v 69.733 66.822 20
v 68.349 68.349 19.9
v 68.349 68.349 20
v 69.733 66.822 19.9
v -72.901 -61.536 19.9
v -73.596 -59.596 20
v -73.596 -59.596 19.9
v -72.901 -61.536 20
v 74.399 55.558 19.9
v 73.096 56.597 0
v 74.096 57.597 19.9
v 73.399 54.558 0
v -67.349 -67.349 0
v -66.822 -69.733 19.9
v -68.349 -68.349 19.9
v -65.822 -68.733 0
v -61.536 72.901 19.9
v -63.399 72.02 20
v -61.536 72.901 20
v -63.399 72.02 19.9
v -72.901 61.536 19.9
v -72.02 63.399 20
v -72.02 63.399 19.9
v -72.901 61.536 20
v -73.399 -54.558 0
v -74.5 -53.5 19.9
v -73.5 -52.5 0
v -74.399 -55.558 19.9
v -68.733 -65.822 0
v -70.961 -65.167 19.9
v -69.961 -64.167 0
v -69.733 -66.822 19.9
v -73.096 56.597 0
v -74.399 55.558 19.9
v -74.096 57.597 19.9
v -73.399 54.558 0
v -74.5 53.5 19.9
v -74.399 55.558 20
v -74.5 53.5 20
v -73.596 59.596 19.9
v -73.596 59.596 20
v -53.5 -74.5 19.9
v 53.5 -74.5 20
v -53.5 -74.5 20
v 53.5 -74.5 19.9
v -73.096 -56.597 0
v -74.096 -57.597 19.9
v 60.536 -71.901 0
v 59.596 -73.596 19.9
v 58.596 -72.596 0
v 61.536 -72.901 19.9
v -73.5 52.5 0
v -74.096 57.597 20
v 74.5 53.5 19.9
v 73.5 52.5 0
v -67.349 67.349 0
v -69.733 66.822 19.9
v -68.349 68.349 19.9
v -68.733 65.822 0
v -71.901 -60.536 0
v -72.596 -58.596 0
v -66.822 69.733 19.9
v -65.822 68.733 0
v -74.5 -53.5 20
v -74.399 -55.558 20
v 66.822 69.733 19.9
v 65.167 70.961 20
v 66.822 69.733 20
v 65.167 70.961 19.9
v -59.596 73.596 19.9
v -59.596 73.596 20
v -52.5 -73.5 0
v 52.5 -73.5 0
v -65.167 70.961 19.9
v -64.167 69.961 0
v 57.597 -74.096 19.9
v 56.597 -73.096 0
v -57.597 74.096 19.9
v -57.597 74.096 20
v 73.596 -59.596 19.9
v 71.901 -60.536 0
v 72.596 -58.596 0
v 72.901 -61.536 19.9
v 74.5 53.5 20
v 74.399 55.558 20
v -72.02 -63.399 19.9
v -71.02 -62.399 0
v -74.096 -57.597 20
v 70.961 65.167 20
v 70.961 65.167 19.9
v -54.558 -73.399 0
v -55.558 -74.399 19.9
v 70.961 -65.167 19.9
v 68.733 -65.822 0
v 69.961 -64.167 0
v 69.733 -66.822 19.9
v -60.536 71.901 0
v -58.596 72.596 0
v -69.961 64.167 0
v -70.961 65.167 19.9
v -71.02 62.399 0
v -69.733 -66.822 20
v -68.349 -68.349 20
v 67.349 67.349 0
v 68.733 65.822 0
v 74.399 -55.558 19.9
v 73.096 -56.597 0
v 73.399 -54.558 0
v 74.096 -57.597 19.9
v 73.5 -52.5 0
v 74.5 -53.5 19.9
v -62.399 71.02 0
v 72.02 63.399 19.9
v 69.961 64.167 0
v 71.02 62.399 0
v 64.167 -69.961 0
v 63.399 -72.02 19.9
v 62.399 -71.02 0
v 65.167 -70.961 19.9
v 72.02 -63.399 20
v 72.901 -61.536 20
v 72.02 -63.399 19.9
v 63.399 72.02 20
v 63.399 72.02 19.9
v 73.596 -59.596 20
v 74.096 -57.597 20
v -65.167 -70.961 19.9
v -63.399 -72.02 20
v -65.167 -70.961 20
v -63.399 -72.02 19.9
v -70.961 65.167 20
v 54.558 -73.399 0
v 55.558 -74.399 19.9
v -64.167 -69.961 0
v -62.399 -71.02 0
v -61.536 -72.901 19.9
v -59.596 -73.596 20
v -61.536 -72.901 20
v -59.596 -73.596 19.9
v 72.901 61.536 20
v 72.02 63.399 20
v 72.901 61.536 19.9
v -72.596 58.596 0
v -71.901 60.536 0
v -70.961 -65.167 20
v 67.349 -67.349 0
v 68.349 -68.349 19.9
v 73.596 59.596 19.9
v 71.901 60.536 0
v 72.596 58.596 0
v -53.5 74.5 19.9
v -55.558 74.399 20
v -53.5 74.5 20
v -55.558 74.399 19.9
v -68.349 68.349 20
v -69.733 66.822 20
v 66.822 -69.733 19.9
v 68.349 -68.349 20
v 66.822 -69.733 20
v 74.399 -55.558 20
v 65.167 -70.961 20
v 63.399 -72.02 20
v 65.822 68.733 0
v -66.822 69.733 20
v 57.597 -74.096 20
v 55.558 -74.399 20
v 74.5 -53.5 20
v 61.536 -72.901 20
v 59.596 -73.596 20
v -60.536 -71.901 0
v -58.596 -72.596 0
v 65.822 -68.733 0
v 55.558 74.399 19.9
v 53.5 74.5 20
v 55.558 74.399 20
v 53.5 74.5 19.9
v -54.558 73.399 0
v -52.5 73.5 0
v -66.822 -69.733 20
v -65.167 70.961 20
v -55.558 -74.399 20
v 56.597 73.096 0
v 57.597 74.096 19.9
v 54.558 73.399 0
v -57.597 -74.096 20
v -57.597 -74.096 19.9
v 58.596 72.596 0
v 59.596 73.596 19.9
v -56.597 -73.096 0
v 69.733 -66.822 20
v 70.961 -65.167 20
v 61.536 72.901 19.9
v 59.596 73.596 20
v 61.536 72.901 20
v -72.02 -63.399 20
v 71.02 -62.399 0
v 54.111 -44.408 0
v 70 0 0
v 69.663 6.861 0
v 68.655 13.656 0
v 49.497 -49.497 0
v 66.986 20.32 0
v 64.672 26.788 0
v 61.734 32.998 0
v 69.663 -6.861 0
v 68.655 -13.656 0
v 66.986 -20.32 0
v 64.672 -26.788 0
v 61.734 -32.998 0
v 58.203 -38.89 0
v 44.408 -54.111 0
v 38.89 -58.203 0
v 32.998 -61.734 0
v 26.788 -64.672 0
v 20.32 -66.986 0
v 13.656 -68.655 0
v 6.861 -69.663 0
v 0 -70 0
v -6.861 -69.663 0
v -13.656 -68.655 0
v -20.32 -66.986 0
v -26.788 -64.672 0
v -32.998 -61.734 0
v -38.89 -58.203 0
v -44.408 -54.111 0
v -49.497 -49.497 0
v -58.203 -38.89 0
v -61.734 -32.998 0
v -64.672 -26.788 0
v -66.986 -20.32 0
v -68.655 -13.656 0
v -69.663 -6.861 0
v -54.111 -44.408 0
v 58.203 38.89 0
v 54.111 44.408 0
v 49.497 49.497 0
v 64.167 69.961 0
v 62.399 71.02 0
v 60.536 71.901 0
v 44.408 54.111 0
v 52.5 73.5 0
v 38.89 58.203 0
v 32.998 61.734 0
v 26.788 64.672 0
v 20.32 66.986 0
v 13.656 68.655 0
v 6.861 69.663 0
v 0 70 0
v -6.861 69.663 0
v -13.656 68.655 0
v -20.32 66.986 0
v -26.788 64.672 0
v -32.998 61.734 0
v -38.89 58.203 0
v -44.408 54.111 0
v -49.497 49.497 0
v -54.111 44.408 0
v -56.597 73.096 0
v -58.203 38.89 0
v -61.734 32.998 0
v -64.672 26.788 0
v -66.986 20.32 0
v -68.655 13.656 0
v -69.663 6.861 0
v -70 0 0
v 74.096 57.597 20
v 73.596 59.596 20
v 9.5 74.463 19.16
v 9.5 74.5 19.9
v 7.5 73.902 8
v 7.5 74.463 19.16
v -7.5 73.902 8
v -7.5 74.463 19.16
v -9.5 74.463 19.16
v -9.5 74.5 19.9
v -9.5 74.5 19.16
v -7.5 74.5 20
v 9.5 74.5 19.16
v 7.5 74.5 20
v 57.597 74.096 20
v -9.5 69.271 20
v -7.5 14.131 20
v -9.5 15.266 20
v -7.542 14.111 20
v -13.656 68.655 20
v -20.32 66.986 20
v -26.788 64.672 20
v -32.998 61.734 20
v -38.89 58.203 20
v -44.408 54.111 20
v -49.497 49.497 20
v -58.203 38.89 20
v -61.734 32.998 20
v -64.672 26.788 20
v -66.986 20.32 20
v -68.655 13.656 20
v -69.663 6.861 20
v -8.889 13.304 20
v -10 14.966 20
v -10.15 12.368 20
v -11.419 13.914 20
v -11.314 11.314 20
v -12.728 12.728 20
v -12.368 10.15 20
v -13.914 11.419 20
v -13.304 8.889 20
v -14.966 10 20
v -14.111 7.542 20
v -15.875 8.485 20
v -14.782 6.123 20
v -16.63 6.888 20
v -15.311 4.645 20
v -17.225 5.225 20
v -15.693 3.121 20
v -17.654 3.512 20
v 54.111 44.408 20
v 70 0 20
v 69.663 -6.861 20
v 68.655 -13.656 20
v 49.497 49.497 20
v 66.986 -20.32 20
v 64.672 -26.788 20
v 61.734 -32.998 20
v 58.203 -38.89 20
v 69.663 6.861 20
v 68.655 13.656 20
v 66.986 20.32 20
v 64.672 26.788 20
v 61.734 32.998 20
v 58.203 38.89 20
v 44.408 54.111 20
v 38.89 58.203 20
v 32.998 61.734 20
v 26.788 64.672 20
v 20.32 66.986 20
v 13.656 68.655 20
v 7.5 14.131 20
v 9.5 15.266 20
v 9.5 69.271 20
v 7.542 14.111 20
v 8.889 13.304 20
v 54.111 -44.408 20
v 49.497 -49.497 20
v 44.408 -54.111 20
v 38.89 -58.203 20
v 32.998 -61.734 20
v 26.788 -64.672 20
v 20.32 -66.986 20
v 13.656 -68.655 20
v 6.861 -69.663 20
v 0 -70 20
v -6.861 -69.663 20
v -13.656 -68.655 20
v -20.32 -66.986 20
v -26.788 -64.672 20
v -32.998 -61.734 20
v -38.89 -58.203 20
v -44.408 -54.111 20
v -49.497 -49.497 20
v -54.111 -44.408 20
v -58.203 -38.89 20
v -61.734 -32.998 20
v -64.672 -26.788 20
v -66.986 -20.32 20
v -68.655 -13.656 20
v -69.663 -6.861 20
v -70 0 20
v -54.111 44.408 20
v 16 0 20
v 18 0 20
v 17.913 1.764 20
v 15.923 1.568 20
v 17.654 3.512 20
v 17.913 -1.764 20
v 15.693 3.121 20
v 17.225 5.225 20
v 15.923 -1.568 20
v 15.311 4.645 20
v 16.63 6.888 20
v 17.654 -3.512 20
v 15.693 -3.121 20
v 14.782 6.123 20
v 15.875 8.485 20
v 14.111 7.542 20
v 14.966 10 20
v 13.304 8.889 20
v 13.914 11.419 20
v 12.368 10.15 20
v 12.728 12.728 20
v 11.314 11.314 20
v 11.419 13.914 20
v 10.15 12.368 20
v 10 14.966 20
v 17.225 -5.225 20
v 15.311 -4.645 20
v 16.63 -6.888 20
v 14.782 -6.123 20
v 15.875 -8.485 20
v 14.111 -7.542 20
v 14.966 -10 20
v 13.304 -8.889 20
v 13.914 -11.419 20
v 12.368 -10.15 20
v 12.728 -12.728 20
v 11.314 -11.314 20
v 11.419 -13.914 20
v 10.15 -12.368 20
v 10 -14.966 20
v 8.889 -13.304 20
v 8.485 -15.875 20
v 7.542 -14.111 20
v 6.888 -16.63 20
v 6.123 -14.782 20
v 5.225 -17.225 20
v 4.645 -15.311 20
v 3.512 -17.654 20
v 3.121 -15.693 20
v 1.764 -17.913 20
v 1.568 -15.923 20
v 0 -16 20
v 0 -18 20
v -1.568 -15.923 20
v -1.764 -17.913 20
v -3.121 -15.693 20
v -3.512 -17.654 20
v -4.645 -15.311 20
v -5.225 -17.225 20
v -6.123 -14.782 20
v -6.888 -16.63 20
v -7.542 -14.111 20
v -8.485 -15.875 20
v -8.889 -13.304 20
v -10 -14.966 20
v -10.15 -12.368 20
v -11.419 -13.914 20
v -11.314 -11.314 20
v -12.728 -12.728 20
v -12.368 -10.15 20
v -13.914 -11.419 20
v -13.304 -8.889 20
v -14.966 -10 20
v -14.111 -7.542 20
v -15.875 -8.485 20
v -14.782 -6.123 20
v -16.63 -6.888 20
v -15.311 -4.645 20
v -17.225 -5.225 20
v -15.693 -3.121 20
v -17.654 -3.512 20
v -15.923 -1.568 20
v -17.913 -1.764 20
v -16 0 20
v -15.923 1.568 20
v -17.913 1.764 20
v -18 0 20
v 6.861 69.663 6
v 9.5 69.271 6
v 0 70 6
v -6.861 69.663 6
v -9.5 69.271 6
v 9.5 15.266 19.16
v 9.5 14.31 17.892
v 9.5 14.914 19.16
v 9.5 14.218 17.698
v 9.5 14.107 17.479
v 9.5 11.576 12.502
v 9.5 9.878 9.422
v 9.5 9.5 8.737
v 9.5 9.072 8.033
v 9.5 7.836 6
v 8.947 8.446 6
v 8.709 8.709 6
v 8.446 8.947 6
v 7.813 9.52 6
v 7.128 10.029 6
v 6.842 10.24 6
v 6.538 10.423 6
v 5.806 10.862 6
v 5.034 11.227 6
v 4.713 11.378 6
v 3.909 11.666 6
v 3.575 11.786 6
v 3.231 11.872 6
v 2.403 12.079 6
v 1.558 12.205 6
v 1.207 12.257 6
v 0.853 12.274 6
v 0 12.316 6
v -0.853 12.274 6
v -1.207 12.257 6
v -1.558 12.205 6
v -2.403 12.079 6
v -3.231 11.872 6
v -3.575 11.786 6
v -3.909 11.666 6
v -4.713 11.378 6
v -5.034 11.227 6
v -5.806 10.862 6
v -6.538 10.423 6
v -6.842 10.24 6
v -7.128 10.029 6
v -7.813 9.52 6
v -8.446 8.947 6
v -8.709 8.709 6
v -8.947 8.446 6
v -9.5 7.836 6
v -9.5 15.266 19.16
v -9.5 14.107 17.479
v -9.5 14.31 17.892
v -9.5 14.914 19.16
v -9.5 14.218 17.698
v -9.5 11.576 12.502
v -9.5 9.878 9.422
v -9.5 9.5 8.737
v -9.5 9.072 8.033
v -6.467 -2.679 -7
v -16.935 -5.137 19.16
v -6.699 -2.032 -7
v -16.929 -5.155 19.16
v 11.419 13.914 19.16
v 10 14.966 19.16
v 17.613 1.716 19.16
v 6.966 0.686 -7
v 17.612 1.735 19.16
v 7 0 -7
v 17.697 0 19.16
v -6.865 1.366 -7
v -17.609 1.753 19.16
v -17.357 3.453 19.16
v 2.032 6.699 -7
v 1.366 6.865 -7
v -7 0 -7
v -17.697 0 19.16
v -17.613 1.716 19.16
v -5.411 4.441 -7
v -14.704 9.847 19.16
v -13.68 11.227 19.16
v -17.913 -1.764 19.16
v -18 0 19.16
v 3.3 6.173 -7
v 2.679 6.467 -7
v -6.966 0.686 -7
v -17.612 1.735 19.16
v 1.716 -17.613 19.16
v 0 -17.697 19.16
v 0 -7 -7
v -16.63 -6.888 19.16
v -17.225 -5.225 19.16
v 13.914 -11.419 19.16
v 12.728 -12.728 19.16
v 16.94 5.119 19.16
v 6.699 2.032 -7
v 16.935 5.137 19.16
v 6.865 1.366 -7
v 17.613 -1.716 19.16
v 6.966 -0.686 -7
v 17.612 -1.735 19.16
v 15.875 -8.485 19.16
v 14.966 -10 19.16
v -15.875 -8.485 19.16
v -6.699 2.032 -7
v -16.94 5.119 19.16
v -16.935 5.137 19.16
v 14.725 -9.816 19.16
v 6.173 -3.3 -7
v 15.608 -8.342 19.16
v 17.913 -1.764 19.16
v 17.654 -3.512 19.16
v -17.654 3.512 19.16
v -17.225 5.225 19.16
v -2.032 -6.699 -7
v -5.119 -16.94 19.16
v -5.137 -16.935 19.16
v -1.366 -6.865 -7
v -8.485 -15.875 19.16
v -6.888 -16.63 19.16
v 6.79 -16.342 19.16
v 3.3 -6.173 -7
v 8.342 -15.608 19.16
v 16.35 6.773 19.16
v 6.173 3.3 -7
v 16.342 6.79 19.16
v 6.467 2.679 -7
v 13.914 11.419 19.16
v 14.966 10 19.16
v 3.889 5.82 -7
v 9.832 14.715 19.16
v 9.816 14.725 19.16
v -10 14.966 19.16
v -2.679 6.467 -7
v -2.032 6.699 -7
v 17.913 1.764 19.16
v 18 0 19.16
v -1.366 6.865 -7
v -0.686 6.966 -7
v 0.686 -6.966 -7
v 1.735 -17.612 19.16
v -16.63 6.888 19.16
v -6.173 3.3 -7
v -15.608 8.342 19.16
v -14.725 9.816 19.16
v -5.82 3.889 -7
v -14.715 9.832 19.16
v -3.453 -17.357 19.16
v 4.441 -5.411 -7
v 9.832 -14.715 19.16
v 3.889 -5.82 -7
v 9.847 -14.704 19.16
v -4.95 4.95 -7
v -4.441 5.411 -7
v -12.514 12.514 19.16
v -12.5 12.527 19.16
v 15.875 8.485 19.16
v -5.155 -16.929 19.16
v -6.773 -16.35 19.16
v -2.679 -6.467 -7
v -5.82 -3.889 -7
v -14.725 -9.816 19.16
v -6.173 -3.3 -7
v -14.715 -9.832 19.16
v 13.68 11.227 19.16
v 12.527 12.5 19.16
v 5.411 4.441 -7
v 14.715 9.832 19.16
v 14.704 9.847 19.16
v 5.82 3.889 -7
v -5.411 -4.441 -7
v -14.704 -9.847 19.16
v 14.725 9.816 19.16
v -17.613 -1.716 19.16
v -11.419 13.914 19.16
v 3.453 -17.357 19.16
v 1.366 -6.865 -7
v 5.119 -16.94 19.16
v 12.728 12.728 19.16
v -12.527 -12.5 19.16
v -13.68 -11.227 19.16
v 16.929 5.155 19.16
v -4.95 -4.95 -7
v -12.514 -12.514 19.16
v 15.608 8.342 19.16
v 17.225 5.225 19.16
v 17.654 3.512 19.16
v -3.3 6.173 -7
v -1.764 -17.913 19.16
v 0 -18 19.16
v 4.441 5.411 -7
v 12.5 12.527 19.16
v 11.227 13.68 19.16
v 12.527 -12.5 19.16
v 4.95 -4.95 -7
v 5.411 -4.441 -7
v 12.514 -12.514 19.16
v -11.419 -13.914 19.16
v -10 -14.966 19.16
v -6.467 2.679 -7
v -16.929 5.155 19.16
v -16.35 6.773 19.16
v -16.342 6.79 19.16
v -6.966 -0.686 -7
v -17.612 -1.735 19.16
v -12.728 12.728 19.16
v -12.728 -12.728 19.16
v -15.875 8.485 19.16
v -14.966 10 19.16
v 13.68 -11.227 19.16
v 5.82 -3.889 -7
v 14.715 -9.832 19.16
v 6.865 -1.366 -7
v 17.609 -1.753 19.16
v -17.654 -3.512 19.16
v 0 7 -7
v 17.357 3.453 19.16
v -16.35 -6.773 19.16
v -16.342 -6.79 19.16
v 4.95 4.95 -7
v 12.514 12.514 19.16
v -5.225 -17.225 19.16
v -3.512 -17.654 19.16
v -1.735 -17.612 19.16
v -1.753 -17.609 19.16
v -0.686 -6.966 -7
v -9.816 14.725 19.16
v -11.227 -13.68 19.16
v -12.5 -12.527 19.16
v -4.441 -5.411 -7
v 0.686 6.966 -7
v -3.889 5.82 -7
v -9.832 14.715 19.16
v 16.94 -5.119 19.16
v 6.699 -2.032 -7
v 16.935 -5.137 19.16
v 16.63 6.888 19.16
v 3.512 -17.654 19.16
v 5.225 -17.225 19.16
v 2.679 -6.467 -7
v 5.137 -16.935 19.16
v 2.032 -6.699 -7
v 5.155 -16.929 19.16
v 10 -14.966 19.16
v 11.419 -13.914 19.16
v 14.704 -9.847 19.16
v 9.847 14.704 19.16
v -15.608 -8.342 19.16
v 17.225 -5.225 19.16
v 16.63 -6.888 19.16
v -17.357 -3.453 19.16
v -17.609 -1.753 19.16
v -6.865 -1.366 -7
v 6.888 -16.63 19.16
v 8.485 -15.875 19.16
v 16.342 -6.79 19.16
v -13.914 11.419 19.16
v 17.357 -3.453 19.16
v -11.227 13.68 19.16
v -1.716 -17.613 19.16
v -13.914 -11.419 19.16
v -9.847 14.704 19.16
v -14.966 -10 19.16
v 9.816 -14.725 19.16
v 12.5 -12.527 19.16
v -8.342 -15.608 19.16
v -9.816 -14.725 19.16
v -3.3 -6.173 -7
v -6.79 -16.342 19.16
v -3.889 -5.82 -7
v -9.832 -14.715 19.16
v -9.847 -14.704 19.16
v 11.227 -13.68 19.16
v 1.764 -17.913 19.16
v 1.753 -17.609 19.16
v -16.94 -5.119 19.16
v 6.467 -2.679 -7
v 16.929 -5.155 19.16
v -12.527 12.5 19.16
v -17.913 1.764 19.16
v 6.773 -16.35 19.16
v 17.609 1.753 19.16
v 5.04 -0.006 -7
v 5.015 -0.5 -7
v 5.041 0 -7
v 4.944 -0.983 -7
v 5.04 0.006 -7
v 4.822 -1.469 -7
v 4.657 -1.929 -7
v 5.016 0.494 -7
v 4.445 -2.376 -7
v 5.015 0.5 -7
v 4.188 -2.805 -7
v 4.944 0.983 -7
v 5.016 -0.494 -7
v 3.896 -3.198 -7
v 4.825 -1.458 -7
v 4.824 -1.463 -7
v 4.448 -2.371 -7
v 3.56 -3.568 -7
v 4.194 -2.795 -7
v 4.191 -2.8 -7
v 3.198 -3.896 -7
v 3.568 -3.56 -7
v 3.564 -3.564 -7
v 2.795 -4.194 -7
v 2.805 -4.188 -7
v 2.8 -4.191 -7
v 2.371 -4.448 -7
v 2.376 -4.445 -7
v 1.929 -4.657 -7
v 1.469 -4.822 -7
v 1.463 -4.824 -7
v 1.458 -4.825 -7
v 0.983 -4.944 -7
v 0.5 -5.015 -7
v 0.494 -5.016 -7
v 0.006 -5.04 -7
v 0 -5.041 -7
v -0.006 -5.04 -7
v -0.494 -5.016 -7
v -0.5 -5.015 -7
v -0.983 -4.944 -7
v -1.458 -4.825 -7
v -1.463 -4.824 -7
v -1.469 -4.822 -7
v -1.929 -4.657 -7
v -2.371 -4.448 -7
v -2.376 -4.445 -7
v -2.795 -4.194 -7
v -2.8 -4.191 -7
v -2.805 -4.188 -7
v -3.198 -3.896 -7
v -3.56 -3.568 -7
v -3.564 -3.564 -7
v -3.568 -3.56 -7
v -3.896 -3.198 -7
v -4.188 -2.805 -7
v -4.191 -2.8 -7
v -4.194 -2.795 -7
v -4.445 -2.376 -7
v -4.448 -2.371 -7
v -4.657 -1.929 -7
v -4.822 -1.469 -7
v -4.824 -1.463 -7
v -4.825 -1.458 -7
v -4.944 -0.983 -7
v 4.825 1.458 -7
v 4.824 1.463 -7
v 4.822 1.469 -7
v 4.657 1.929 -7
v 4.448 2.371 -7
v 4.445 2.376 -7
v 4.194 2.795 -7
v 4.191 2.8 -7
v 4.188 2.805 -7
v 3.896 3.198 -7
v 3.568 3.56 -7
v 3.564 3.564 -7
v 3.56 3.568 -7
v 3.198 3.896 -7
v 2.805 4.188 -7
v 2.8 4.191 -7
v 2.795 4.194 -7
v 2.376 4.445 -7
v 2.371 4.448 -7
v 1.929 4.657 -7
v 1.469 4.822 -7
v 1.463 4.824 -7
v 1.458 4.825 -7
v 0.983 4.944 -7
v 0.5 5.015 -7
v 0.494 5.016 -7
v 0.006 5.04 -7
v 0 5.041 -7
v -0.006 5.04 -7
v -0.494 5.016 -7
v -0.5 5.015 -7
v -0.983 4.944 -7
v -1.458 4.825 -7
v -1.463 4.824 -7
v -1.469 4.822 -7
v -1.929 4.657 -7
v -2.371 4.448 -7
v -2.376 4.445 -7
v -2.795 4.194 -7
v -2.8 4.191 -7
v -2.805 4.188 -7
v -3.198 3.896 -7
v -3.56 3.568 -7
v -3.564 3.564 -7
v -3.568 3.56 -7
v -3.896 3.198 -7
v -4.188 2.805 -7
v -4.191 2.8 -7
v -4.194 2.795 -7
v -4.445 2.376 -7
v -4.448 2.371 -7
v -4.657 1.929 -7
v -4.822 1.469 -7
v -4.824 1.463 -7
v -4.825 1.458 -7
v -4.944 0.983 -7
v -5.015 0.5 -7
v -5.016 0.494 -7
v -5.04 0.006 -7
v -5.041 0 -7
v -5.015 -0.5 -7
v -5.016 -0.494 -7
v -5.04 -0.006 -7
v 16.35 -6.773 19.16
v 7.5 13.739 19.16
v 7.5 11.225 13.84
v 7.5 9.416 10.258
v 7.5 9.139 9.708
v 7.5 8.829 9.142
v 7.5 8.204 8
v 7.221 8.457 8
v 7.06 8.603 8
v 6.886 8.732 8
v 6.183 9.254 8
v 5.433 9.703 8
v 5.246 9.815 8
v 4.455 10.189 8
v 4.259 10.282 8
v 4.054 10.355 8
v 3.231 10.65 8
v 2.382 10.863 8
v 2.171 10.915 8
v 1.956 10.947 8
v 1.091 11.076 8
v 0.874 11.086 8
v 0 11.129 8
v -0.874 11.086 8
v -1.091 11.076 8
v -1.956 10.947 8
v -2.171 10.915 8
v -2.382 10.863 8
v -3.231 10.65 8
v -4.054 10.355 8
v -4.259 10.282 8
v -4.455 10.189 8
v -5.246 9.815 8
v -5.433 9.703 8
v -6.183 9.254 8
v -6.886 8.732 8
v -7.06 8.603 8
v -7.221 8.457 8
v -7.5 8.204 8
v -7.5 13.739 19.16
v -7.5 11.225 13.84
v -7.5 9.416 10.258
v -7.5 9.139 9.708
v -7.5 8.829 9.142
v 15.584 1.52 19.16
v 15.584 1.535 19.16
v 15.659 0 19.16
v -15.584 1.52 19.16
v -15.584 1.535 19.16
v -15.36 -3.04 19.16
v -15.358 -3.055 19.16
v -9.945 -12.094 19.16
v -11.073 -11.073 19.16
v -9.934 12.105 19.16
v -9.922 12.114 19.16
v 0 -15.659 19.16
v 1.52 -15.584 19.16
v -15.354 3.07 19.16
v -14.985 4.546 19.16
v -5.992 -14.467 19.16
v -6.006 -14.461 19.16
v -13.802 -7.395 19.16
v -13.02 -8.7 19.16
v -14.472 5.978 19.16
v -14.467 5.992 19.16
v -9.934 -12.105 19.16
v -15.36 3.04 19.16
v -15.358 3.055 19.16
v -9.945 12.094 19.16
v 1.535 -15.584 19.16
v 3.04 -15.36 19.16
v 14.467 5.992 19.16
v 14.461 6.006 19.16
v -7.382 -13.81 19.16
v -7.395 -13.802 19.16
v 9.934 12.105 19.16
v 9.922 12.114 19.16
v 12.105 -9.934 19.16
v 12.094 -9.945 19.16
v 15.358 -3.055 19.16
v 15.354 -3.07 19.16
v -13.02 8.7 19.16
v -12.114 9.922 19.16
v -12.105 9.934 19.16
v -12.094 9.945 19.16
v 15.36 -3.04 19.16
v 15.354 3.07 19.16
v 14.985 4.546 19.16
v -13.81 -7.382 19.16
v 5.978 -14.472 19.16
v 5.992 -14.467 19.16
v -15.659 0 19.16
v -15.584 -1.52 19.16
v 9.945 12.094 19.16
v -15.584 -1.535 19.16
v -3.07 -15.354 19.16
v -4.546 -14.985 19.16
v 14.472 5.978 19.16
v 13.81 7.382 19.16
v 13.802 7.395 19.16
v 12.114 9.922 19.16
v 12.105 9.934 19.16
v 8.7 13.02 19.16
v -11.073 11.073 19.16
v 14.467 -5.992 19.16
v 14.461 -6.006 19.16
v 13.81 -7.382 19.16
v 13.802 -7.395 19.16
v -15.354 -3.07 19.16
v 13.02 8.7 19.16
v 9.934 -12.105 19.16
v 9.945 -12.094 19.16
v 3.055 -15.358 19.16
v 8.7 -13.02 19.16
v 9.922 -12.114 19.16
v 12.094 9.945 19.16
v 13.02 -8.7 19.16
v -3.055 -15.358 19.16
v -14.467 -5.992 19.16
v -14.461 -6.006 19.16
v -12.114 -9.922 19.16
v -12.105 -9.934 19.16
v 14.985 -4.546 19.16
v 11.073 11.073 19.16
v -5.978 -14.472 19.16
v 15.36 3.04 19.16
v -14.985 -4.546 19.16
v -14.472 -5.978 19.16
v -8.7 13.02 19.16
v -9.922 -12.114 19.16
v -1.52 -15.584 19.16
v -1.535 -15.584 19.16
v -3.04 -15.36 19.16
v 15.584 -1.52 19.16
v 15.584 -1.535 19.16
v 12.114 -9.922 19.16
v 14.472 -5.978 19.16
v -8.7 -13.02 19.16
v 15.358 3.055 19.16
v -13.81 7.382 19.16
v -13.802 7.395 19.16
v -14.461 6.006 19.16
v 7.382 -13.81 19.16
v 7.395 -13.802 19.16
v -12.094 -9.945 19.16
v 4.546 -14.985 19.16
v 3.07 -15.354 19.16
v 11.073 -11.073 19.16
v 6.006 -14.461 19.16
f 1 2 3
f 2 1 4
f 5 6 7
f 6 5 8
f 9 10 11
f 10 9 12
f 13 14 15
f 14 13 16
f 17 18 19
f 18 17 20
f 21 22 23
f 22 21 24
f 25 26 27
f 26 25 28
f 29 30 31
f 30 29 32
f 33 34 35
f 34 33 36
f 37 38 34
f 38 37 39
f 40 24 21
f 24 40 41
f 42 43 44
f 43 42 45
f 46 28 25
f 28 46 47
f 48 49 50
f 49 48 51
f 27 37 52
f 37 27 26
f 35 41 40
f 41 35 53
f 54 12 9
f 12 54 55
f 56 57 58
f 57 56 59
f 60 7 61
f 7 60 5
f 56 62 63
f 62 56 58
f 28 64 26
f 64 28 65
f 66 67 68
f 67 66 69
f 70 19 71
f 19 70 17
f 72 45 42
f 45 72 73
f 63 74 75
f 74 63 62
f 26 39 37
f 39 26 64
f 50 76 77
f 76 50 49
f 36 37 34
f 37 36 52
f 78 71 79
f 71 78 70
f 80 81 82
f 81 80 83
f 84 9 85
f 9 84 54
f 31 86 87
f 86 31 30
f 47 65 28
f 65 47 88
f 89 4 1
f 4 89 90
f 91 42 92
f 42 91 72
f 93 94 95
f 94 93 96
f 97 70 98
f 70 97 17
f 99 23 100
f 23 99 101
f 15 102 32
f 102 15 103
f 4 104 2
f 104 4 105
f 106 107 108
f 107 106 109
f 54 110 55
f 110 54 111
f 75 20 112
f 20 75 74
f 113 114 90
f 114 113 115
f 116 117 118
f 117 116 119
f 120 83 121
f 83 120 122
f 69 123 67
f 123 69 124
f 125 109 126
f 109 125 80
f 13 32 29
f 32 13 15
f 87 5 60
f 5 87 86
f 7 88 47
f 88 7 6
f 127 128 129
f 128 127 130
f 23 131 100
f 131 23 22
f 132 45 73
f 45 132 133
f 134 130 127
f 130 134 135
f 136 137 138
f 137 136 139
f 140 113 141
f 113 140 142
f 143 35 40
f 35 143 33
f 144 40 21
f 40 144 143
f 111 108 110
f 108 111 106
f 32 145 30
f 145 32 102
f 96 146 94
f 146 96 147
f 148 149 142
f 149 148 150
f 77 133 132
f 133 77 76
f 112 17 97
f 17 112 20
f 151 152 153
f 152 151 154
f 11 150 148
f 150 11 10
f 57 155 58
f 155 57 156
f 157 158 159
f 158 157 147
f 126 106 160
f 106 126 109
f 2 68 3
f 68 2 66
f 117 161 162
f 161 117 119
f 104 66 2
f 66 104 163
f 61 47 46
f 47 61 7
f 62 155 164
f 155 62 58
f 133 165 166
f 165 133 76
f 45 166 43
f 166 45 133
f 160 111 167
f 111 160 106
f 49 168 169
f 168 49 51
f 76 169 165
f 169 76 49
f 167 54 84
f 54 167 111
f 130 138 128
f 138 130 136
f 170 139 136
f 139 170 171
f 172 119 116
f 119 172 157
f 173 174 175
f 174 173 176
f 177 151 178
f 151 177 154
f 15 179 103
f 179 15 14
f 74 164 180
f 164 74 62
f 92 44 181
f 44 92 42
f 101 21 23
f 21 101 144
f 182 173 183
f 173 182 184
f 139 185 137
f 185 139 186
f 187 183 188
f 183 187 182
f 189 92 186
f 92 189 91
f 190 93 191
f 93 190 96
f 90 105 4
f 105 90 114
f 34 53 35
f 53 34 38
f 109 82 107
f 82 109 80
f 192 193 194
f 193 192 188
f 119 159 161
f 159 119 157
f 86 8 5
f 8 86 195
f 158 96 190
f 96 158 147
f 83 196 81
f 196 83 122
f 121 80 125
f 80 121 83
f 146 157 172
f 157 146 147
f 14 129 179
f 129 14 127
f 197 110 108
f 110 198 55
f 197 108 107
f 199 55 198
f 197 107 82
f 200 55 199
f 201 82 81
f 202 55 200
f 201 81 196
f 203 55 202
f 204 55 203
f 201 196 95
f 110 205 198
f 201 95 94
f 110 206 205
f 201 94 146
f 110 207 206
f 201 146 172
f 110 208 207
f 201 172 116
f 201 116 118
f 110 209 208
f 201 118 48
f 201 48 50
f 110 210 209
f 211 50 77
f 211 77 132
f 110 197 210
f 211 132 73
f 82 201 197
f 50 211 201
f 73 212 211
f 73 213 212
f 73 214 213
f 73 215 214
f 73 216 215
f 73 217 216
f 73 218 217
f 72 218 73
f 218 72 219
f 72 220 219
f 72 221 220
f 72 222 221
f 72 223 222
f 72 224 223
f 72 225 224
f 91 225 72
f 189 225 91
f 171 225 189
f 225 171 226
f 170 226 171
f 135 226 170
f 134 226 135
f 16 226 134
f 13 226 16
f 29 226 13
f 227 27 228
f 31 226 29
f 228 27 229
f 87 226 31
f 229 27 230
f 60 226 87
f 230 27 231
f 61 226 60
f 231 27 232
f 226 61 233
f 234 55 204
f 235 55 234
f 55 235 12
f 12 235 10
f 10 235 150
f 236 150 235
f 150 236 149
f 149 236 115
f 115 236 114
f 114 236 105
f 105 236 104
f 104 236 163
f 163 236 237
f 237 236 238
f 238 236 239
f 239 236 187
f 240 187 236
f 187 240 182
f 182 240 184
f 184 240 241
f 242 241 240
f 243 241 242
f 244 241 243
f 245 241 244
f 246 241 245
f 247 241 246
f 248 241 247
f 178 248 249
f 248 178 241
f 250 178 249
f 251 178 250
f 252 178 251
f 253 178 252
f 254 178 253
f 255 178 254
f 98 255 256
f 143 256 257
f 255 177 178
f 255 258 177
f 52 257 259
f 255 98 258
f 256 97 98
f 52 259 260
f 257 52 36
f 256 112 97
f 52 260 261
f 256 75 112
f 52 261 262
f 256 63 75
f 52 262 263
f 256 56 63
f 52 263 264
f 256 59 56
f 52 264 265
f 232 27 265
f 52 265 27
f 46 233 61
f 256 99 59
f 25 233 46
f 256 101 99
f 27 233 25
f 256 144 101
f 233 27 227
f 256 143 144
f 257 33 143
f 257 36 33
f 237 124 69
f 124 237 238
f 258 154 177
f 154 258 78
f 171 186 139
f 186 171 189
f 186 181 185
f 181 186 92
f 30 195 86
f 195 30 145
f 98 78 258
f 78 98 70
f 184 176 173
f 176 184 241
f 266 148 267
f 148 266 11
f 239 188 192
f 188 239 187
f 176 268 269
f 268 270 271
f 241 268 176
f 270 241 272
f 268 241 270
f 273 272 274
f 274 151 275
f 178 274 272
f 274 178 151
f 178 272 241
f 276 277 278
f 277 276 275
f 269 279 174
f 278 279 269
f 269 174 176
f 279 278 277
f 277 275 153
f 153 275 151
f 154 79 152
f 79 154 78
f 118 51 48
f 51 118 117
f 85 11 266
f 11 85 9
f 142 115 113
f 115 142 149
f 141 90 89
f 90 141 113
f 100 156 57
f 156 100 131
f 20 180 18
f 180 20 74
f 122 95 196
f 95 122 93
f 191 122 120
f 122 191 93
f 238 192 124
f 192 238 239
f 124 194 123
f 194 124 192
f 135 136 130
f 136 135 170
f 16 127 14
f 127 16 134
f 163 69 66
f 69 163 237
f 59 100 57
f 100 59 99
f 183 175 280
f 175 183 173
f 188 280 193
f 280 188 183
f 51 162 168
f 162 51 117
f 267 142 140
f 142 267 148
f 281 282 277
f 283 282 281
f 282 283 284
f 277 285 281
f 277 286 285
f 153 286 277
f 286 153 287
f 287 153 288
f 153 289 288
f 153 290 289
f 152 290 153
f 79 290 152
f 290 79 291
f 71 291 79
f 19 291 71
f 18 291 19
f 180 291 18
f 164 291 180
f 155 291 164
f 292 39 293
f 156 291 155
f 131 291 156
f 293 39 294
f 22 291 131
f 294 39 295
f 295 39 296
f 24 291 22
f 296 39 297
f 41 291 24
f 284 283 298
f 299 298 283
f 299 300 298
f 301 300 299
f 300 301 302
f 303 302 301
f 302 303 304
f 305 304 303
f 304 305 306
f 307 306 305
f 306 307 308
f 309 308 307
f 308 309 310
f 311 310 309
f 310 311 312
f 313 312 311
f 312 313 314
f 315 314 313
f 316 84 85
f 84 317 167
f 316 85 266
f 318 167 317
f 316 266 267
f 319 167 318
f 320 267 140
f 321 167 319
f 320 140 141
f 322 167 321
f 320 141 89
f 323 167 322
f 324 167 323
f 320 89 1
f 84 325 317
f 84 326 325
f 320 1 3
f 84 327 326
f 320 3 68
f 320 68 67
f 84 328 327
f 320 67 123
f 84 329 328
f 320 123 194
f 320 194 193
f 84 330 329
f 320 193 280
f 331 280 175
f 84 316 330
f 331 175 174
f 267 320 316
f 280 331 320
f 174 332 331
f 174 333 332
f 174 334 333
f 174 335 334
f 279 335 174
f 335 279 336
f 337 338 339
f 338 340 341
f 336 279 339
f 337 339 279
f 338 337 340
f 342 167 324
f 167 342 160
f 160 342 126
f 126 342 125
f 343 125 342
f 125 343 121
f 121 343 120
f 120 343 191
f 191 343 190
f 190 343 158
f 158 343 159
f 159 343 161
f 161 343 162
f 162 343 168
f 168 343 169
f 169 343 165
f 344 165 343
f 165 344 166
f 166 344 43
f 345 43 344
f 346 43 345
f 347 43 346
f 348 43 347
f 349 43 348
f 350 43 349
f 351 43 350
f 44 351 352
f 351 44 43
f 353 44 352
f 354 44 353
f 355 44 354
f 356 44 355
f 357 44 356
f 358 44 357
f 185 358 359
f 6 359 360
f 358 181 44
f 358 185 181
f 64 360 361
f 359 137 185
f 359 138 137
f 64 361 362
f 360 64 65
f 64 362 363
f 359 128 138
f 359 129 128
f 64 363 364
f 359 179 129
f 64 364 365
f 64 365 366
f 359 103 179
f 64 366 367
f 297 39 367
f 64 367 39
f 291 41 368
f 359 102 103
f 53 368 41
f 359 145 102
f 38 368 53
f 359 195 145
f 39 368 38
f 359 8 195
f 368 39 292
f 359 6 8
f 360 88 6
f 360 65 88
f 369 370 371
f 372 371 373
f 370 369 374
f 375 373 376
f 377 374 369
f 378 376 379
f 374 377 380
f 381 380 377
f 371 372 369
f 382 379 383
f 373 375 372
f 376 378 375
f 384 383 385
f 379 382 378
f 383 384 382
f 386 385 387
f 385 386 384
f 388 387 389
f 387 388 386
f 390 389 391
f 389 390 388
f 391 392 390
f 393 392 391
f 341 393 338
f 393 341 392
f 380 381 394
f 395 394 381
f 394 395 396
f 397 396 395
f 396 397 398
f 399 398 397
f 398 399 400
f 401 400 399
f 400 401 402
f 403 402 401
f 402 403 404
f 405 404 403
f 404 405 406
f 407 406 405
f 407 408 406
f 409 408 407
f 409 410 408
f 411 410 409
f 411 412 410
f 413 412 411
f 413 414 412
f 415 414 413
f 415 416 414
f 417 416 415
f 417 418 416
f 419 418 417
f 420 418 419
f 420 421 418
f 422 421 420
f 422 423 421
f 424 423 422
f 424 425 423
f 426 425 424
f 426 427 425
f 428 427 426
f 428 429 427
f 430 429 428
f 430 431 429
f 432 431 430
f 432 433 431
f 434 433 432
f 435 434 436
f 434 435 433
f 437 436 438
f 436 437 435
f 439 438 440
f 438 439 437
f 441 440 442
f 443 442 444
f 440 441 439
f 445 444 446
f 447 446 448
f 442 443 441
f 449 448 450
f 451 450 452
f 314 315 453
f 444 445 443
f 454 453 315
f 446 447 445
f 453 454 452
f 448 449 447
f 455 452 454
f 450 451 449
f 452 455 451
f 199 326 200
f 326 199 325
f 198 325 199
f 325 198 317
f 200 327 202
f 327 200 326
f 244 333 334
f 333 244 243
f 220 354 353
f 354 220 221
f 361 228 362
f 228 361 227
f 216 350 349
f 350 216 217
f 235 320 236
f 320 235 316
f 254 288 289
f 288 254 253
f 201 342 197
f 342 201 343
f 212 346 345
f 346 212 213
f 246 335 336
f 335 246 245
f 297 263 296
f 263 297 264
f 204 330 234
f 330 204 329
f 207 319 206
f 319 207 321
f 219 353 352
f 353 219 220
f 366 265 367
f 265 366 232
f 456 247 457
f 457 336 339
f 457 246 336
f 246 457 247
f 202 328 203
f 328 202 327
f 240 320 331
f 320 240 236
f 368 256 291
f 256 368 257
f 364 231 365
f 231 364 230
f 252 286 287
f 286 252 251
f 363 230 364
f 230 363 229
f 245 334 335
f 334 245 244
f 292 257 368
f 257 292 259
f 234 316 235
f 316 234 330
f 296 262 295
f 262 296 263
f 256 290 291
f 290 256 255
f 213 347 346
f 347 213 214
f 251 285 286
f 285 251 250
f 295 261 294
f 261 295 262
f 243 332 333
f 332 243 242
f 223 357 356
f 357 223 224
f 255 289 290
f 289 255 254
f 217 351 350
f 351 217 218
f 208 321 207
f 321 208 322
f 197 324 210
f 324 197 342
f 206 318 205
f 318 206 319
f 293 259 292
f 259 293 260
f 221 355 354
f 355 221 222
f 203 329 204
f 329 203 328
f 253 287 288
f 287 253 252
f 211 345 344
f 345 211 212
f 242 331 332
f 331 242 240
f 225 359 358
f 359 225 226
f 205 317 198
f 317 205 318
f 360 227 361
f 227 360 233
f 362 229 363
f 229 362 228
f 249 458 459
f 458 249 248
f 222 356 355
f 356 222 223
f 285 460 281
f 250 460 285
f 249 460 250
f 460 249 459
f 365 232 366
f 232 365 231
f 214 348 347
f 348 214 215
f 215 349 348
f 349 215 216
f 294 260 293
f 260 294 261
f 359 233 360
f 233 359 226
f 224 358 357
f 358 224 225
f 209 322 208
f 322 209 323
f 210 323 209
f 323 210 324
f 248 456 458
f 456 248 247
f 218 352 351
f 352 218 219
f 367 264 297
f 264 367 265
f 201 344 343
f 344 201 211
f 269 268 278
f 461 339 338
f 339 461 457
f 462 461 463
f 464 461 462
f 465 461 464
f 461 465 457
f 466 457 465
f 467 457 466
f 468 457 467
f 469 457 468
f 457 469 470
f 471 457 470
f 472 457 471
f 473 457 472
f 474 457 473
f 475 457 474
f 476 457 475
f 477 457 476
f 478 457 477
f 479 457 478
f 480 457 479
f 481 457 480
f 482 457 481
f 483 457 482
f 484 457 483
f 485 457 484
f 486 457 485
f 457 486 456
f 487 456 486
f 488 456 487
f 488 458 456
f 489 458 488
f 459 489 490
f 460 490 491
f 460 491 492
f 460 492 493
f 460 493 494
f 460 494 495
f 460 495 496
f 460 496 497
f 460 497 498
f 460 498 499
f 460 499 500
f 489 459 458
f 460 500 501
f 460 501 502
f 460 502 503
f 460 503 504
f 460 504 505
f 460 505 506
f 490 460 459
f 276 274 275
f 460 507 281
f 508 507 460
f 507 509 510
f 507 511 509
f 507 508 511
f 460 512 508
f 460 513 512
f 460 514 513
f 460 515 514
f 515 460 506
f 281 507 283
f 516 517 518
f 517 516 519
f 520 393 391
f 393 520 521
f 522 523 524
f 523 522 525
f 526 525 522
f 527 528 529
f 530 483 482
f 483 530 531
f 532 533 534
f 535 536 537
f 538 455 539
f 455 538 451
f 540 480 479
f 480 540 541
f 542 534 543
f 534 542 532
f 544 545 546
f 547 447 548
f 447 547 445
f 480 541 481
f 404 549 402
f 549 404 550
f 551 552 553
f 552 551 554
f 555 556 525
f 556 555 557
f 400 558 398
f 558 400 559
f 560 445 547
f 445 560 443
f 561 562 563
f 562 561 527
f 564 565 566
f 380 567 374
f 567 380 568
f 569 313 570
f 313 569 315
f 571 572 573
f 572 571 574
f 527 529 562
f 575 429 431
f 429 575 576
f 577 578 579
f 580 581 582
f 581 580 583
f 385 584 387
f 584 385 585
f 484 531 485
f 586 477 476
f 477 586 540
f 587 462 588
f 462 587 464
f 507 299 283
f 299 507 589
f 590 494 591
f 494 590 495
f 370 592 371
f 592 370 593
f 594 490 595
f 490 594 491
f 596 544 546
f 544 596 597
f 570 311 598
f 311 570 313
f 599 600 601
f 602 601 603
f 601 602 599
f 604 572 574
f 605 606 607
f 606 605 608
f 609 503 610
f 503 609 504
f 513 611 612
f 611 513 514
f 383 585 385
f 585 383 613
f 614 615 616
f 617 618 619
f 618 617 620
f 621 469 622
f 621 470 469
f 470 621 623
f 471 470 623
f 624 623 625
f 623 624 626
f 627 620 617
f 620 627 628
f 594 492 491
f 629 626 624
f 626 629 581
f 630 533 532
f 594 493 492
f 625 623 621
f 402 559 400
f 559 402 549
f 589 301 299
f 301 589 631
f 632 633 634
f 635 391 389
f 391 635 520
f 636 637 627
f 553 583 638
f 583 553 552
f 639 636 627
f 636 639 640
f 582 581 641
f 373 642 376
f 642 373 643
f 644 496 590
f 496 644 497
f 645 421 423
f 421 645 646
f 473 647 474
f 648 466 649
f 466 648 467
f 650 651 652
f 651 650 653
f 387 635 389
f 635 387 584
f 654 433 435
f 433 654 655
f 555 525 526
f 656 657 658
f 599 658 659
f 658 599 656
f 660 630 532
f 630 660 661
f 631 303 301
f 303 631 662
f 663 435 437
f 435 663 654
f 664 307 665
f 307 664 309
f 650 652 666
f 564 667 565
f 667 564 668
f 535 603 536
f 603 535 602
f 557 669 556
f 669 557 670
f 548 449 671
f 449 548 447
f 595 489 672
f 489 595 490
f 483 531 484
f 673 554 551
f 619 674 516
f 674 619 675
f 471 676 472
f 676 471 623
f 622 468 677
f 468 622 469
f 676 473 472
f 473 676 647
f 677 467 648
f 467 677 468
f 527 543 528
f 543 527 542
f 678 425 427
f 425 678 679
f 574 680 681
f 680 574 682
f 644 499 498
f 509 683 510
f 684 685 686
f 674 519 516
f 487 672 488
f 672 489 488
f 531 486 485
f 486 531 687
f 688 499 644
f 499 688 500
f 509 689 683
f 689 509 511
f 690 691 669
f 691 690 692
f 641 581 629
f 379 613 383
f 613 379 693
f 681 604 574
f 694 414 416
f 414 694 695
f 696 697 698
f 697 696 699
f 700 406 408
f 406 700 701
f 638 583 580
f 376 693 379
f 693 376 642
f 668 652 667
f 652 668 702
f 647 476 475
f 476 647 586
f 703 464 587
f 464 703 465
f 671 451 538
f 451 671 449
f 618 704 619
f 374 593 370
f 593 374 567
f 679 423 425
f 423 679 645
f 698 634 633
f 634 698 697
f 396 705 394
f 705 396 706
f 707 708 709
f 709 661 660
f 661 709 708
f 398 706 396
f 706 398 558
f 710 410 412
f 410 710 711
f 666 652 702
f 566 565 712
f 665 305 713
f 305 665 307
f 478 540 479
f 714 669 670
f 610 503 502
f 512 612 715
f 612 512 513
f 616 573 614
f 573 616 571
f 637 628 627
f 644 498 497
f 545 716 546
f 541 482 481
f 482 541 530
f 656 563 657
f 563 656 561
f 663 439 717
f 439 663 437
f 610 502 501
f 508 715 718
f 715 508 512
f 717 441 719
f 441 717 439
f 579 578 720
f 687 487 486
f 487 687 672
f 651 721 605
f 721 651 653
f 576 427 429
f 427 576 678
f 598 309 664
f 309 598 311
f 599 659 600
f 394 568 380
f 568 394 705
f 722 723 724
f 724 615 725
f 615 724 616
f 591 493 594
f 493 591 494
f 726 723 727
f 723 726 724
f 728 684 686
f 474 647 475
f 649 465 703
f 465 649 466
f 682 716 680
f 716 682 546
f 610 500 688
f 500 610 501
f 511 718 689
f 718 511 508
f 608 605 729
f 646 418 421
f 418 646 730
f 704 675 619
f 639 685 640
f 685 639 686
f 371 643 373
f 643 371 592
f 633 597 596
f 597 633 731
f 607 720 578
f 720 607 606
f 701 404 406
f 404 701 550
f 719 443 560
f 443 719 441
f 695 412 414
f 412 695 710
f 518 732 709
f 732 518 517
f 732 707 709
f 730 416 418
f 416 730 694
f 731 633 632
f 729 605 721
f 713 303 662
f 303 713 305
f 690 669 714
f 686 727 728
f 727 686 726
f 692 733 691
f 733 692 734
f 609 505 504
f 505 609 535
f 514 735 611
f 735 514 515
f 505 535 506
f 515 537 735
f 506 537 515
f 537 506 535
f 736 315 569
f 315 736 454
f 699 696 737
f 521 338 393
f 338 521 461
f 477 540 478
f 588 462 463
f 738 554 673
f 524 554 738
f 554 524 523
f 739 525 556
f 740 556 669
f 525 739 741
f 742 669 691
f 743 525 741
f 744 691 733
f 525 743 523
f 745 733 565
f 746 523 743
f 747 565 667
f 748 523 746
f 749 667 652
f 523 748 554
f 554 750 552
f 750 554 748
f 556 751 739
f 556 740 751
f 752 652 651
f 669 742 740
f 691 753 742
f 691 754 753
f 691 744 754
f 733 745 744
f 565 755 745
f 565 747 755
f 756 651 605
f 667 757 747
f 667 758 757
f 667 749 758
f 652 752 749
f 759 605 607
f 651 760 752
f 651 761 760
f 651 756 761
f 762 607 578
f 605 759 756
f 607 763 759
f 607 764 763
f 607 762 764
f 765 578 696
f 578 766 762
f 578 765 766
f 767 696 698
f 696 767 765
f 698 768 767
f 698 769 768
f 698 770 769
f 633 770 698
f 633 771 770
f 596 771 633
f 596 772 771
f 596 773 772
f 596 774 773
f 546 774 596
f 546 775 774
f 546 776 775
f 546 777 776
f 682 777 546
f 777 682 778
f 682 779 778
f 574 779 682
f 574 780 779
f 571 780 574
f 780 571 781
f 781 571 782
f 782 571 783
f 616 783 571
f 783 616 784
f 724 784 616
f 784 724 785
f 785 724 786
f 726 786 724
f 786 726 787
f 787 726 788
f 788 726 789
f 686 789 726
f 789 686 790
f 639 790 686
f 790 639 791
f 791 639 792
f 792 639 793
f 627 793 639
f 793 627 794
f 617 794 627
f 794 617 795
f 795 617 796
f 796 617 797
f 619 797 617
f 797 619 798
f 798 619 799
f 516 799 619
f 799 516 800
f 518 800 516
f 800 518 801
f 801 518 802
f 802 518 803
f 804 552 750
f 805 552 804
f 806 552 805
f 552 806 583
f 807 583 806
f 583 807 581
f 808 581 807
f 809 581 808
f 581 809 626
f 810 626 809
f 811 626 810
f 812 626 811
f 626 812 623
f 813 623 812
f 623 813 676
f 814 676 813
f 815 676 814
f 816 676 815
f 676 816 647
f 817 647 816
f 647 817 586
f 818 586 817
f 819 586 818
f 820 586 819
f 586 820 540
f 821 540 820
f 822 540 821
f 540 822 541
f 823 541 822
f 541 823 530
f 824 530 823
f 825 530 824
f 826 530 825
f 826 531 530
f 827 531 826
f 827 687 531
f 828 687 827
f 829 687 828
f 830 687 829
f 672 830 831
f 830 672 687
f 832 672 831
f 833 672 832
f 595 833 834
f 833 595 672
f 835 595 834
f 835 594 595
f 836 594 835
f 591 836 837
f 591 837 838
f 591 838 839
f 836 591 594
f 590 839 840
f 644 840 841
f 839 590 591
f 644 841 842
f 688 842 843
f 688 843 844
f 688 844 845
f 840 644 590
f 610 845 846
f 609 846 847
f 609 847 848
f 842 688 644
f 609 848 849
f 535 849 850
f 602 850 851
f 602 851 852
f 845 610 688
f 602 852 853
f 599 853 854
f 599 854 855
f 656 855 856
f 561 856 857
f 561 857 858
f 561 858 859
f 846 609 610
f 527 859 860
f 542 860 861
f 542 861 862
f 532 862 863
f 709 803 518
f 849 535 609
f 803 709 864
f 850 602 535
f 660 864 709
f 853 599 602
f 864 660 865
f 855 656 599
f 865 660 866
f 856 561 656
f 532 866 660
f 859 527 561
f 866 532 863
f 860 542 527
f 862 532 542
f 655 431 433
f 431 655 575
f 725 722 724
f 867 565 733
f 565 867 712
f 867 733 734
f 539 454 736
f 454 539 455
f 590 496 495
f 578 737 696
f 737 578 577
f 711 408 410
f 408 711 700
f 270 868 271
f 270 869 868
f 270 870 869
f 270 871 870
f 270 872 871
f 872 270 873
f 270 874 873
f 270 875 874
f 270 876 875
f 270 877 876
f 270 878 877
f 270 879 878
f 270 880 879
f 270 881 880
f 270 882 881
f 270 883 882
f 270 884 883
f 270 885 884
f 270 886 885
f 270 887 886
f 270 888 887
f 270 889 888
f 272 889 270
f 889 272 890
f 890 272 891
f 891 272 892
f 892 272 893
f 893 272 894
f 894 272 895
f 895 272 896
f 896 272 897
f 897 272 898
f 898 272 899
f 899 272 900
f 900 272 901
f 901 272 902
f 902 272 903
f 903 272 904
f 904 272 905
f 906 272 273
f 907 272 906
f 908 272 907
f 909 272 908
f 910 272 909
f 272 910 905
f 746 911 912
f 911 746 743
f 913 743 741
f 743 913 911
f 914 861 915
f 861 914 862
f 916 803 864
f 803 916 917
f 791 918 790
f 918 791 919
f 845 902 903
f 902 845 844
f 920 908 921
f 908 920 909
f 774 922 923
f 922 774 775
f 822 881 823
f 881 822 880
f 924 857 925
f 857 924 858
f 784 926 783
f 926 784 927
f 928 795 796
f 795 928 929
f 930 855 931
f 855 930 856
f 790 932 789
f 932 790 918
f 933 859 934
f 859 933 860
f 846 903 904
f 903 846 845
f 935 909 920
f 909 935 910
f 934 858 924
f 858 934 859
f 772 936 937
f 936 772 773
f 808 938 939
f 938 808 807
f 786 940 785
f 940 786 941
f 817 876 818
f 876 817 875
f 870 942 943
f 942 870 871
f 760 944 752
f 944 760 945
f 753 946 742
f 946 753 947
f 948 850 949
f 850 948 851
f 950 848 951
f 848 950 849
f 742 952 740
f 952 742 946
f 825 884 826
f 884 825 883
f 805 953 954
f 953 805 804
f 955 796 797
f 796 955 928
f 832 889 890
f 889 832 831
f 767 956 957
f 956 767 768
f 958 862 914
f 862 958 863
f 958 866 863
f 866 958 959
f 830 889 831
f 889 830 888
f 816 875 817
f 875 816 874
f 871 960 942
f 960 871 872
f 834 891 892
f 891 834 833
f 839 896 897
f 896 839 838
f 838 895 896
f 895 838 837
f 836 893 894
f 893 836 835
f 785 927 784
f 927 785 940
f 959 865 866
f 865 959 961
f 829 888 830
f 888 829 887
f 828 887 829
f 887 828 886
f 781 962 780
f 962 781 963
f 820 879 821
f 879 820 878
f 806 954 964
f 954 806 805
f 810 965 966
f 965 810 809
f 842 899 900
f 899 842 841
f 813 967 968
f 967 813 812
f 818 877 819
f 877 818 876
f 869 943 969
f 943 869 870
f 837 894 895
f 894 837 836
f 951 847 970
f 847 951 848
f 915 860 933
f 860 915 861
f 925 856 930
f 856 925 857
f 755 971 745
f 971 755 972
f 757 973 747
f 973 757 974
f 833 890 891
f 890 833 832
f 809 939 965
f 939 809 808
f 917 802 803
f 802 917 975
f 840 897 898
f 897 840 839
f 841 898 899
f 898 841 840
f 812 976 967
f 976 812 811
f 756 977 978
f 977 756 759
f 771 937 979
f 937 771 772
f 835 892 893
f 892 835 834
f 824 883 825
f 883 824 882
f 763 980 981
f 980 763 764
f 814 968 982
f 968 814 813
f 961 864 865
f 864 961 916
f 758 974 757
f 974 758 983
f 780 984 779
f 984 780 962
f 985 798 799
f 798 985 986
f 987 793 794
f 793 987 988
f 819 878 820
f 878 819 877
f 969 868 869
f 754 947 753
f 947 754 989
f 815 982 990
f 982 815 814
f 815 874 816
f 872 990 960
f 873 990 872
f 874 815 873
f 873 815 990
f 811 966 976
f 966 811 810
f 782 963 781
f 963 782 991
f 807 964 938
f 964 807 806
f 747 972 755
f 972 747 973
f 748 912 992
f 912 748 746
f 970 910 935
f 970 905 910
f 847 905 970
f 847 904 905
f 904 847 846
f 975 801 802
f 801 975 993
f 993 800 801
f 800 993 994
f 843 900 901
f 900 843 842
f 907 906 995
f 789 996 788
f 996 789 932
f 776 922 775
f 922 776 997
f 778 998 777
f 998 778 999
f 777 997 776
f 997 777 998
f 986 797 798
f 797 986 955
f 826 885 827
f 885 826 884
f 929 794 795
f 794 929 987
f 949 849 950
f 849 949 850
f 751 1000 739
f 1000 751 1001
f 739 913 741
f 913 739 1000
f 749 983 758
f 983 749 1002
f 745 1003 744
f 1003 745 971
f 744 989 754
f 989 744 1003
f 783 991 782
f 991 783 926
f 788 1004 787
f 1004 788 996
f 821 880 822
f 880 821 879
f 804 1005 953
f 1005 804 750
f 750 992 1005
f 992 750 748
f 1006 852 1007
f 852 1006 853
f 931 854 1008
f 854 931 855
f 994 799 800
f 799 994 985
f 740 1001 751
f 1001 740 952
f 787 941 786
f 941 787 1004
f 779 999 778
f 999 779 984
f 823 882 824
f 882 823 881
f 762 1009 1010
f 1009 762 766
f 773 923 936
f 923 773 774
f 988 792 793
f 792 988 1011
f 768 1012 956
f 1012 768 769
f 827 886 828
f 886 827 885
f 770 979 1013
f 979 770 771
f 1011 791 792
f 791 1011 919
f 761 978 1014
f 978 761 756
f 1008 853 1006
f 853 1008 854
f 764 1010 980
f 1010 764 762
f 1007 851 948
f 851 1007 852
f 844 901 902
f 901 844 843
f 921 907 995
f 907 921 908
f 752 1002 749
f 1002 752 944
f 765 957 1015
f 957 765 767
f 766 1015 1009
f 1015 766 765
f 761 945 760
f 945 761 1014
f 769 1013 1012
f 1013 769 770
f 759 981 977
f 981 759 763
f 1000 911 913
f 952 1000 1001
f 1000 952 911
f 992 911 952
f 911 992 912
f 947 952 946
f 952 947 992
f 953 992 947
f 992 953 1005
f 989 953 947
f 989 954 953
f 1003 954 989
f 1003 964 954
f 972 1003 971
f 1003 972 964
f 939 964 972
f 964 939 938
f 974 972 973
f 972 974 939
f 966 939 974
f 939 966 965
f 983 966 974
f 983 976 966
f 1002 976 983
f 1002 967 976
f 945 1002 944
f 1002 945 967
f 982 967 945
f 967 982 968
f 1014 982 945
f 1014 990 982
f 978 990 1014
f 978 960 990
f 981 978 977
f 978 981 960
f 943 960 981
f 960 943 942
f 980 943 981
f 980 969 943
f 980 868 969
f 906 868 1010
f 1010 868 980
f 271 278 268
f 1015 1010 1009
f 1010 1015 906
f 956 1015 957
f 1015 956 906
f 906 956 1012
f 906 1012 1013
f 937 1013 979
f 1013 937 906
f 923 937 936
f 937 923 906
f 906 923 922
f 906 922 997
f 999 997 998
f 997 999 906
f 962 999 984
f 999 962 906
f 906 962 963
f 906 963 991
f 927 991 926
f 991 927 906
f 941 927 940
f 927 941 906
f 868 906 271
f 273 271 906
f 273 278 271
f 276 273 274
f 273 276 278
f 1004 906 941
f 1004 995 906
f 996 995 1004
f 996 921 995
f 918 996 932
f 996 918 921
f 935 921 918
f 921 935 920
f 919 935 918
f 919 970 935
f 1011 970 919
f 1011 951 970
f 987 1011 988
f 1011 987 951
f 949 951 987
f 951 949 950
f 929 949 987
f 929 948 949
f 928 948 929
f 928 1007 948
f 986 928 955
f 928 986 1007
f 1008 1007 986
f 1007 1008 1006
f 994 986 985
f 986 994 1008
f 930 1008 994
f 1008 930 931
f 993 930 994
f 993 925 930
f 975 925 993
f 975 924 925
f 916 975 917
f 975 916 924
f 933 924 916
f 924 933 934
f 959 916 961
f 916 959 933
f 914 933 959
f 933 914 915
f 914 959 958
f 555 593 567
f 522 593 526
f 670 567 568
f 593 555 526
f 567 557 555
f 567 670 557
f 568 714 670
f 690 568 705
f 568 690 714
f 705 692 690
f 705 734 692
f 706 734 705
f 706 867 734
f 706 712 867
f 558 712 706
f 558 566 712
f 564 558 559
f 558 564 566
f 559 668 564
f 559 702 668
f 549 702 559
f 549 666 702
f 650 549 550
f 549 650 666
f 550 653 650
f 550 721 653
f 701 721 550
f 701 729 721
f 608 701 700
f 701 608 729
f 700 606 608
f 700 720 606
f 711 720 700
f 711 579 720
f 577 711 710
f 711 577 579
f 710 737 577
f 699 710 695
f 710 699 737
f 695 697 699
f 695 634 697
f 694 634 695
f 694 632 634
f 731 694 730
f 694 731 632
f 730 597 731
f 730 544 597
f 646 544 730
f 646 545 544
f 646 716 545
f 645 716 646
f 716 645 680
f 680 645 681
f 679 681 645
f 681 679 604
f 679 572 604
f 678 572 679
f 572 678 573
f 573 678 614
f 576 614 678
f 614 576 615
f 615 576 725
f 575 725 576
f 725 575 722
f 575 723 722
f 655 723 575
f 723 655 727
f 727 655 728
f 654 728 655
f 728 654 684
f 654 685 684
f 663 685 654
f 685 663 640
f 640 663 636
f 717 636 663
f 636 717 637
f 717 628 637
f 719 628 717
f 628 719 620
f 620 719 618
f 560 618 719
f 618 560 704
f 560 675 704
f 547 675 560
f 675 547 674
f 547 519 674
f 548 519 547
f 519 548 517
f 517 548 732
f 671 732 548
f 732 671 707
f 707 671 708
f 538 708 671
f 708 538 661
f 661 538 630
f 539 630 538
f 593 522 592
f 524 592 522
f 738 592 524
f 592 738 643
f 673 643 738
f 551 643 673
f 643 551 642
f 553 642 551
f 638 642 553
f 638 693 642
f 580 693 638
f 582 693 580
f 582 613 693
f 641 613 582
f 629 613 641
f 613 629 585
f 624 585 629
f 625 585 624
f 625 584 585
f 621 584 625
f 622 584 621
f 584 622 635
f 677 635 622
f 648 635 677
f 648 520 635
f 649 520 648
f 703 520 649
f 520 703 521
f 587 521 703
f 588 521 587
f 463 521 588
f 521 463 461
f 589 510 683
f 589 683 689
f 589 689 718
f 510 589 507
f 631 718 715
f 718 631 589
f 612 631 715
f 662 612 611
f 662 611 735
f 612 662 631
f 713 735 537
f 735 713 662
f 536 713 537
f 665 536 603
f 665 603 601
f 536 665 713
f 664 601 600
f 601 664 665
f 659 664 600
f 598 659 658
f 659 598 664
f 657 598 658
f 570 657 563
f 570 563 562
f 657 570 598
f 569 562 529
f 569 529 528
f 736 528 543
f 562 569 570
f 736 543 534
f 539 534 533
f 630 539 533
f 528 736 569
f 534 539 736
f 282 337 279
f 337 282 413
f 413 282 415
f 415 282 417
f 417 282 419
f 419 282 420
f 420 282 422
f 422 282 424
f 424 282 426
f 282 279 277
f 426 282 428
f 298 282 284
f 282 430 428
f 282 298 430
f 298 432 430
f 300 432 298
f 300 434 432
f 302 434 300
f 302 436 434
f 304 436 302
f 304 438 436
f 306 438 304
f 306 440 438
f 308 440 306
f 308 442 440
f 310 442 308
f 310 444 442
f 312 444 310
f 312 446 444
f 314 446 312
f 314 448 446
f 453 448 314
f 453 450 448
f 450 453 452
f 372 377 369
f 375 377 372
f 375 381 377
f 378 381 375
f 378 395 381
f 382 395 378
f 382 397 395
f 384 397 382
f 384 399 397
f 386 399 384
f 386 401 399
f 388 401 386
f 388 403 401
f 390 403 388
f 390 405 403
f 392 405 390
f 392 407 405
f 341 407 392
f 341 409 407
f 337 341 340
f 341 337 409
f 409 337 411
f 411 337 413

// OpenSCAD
// topw=149;
// topr=20;

topw=149;
topr=21;

bottomw=147;
bottomr=21;


$fn=64;

difference() {
union() {
  difference() {
    block();
    translate([0,0,-0.1]) cylinder(r=70,h=20.2);
  
  }
  translate([-9.5,6,6]) cube([19,65,14]);
  hull() {
    translate([0,0,19.9]) linear_extrude(height=0.1) circle(r=18); 
    translate([0,0,-7]) linear_extrude(height=0.1) circle(r=7);
  }
}
translate([-7.5,0,8]) cube([15,100,12.1]);
  hull() {
    translate([0,0,20]) linear_extrude(height=0.1) circle(r=16); 
    translate([0,0,-7.1]) linear_extrude(height=0.1) circle(r=5);
  }}

translate([0,0,20-0.84]) {
  cylinder(r=18,h=0.84);
  translate([-9.5,0,0]) cube([19,topw/2,0.84]);
}
// difference() { 
//   circle(r=7);
//   circle(r=5);
// }


// translate([0,0,1]) difference() { 
//   circle(r=15);
//   circle(r=13);
// }


module block() {
  hull() {
    translate([0,0,19.9]) linear_extrude(height=0.1) plane(topw,topr);
    linear_extrude(height=0.1) plane(bottomw,bottomr);
  }
}



// difference() {
//   hull() {
//     translate([0,0,19.9]) linear_extrude(height=0.1) plane(topw,topr);
//     linear_extrude(height=0.1) plane(bottomw,bottomr);
//   }
//   hull() {
//     translate([0,0,20]) linear_extrude(height=0.1) plane(topw-5,topr-2.5);
//     translate([0,0,-0.1]) linear_extrude(height=0.1) plane(bottomw-5,bottomr-2.5);
//   }
// }

// difference() {
  
//   w=bottomw;
//   r=bottomr;

//   linear_extrude(height=1.5) plane(w,r);
  
//   dd=5;
//   dw=w-dd;
//   dr=r-dd/2;

//   translate([0,0,-0.1]) linear_extrude(height=2.2) plane(dw,dr);
// }


module plane(w,r) {
  d=w/2-r;
  hull() {
    translate([d,d]) circle(r=r);
    translate([d,-d]) circle(r=r);
    translate([-d,d]) circle(r=r);
    translate([-d,-d]) circle(r=r);
  }
}
